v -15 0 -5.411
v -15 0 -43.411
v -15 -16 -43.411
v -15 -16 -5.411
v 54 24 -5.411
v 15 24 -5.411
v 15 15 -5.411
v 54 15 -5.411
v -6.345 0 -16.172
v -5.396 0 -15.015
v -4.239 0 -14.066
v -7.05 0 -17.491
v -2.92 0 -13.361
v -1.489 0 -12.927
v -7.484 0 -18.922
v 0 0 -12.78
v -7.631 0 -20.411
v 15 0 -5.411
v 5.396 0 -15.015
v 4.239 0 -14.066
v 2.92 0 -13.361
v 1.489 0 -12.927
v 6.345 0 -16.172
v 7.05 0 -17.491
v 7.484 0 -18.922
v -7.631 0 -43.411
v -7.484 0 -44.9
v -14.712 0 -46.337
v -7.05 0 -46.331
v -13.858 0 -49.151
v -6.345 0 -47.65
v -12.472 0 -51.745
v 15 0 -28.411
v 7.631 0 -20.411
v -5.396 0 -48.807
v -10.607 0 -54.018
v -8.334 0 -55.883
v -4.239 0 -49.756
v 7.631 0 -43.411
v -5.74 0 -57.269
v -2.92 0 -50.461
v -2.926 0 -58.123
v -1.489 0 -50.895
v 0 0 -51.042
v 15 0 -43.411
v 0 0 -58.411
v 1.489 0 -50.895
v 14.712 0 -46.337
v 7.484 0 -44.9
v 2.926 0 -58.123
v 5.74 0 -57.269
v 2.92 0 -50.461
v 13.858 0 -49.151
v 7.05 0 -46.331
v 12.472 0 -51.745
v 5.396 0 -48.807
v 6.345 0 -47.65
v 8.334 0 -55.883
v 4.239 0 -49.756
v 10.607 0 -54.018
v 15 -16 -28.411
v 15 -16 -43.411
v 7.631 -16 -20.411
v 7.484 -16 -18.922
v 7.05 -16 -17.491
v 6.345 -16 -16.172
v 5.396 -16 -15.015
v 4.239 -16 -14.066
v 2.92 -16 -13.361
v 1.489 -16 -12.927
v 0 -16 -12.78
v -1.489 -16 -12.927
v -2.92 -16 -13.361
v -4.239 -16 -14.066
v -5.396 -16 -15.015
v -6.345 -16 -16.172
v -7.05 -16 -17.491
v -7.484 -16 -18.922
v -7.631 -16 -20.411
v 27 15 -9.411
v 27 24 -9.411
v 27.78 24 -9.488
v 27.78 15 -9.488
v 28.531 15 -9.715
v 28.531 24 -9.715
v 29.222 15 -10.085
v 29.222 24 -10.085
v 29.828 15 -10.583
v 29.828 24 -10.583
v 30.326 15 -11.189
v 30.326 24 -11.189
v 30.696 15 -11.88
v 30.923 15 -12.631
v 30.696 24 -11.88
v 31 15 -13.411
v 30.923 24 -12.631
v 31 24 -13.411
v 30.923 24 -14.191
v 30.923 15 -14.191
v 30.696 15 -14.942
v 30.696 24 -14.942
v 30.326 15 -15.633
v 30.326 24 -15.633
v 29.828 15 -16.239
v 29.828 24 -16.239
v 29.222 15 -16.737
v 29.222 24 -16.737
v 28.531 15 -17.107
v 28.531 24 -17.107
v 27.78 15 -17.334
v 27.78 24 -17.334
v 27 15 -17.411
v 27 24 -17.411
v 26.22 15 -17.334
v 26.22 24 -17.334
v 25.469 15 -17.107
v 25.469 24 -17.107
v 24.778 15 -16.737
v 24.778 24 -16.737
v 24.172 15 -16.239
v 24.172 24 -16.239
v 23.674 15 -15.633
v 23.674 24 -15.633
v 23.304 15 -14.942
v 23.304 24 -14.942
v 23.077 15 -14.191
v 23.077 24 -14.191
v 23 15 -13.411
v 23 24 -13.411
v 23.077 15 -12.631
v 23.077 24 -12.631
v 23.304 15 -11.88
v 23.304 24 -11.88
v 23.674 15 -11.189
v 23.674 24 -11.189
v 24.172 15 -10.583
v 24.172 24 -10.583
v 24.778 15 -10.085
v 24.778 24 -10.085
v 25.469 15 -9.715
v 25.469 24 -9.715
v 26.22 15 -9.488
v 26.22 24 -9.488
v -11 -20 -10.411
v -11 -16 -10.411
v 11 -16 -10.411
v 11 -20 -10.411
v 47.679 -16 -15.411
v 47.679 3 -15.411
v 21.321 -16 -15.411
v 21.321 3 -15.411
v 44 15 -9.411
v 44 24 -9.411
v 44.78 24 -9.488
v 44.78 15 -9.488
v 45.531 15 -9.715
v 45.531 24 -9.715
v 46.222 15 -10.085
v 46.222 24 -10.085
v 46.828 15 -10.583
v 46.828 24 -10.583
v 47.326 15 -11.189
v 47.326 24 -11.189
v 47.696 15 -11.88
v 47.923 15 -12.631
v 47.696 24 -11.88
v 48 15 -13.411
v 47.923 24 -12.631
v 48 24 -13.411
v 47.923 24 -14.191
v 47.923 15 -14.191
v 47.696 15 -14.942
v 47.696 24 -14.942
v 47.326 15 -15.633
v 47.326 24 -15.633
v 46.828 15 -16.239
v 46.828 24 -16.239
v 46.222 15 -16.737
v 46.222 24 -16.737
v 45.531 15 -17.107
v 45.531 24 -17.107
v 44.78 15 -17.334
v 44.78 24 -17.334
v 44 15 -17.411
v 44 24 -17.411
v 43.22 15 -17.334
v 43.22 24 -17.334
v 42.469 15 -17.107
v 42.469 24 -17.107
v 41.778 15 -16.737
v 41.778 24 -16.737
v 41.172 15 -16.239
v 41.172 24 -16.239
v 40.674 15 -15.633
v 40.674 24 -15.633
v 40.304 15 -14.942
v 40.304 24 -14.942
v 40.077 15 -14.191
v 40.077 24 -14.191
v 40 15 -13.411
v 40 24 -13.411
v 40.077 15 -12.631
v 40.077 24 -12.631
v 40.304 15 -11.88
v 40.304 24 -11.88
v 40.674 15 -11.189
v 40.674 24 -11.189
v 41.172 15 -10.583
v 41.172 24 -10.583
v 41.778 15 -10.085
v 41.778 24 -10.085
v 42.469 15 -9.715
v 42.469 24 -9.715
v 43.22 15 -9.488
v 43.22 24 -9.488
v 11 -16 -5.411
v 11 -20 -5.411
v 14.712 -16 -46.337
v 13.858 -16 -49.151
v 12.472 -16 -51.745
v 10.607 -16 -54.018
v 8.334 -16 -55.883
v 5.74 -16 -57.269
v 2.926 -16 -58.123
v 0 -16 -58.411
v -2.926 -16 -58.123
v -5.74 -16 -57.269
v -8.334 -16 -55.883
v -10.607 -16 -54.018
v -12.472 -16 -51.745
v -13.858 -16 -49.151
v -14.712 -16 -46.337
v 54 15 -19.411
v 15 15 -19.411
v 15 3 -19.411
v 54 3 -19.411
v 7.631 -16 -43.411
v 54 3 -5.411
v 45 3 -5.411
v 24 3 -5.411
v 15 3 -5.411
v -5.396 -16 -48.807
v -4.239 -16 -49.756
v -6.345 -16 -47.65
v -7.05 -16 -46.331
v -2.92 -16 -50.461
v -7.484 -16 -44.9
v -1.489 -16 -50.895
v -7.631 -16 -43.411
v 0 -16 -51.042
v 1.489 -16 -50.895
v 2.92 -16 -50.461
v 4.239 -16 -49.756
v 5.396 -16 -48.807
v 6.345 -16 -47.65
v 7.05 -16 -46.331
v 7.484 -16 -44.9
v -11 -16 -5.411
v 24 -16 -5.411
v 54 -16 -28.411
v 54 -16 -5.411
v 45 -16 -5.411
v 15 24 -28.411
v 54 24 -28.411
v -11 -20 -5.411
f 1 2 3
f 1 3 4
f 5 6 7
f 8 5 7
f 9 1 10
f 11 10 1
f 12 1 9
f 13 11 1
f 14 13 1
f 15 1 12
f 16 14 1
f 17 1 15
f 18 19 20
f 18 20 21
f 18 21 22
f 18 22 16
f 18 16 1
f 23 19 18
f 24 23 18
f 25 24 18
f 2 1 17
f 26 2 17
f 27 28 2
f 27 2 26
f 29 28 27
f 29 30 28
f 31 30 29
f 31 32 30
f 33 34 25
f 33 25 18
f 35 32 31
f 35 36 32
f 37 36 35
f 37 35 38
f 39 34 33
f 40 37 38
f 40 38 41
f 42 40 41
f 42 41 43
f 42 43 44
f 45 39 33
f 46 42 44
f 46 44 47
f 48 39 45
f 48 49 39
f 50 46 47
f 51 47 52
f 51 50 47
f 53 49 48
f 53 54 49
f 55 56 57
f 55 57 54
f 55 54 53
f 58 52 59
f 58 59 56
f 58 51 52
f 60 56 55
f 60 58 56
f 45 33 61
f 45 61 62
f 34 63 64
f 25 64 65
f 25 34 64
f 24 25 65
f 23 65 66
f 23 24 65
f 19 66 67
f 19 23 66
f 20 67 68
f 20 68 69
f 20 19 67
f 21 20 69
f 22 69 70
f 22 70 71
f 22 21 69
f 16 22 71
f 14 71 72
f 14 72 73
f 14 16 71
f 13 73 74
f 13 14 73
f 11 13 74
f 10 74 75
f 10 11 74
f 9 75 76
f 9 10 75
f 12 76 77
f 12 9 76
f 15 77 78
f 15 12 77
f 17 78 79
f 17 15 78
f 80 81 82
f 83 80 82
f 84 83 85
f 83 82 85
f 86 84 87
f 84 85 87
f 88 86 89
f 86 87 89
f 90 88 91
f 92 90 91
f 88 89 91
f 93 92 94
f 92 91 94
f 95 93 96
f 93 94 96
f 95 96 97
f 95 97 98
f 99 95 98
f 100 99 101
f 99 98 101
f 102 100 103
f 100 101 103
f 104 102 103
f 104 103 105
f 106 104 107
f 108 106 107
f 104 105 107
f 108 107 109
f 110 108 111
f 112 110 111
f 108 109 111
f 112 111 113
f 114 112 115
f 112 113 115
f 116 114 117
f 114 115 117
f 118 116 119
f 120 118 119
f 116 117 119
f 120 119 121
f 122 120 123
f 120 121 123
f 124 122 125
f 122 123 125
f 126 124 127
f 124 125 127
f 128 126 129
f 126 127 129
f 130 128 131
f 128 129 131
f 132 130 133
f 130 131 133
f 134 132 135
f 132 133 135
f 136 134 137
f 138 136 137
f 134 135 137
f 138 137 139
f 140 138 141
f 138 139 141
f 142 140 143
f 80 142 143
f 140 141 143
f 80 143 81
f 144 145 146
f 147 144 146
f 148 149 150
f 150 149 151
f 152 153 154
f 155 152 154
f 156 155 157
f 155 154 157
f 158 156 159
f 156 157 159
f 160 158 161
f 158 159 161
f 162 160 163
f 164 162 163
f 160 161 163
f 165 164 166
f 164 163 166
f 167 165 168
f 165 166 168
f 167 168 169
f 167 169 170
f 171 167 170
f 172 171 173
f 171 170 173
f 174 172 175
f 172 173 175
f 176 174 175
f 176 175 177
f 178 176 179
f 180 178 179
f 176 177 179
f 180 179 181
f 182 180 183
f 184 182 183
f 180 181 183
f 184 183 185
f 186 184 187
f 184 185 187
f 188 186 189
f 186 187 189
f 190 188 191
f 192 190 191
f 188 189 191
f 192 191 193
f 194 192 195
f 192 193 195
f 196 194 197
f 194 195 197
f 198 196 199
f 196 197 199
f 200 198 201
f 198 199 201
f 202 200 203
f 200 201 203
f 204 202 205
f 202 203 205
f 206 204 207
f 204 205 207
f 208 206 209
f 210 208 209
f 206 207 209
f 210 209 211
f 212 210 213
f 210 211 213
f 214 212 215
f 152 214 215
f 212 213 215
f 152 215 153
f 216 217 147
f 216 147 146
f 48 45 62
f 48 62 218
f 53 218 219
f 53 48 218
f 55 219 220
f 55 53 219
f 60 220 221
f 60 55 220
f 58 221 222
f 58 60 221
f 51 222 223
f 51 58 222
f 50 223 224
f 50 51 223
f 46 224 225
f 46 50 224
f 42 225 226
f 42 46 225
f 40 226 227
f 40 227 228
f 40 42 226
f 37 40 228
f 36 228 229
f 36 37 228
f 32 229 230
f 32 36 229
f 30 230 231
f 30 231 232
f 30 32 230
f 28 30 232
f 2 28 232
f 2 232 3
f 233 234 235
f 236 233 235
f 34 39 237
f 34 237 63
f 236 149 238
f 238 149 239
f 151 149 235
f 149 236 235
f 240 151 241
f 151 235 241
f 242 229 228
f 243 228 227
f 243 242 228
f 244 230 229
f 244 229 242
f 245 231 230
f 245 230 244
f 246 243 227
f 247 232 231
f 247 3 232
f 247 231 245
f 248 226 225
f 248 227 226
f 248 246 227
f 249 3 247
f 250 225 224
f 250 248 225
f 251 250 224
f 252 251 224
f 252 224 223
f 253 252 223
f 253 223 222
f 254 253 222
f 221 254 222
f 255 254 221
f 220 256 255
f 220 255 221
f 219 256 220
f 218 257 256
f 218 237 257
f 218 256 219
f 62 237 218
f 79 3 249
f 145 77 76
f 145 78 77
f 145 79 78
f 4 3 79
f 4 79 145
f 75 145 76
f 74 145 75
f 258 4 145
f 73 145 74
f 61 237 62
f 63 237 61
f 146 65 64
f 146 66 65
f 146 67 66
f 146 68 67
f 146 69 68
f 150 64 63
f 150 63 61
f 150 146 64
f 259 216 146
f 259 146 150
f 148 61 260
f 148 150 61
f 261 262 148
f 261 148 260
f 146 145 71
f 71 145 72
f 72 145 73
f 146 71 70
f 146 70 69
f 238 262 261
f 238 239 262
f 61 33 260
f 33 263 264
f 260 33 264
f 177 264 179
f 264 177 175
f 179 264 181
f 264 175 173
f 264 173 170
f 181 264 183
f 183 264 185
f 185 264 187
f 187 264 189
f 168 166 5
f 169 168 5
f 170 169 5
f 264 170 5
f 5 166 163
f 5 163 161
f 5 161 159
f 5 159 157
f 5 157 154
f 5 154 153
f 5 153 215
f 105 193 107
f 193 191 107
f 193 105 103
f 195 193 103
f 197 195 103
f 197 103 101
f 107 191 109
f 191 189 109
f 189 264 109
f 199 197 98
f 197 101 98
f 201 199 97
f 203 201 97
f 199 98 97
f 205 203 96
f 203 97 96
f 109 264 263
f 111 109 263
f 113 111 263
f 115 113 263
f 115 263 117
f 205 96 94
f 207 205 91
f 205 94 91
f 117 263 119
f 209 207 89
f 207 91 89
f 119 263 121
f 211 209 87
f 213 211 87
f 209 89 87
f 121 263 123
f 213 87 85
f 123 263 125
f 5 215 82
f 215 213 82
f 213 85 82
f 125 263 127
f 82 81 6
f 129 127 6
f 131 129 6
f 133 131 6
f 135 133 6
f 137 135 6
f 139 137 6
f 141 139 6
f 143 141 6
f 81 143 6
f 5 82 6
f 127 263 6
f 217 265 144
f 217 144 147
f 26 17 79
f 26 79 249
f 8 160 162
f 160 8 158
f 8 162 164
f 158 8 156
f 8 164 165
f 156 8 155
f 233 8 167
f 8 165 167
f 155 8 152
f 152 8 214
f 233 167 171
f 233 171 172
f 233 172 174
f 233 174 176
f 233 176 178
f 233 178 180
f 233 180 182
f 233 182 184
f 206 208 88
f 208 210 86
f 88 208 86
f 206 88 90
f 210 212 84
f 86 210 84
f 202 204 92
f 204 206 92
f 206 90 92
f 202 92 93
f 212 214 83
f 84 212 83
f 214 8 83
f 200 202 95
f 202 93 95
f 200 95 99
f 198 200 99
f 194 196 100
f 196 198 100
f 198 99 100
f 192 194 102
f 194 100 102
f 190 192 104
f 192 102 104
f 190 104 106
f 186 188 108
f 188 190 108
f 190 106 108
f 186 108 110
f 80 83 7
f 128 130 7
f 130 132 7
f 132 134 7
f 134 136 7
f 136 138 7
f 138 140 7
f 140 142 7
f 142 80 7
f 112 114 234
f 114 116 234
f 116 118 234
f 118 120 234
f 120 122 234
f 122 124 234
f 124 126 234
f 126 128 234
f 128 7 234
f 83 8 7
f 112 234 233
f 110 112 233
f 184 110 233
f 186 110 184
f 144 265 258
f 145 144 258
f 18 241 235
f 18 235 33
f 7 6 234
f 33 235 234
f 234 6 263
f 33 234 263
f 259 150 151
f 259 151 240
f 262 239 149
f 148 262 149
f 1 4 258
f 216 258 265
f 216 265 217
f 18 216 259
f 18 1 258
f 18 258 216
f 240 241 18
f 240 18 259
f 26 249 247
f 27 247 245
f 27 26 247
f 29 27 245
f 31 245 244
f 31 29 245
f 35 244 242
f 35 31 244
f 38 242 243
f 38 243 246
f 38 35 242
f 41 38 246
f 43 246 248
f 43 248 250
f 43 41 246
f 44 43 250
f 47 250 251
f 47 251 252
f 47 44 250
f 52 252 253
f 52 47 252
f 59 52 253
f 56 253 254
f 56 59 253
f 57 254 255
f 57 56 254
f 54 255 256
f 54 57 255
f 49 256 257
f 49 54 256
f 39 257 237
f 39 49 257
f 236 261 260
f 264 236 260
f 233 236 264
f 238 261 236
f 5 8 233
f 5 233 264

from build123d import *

# Parameters (mm, degrees)
BOSS_EXTRUDE1_DEPTH = 16
BOSS_EXTRUDE2_DEPTH = 39
SKETCH5_R           = 4
CUT_EXTRUDE1_DEPTH  = 9
SKETCH7_W           = 39
SKETCH7_H           = 16
BOSS_EXTRUDE3_DEPTH = 23
CUT_EXTRUDE2_DEPTH  = 23
SKETCH10_W          = 22
SKETCH10_H          = 4
BOSS_EXTRUDE4_DEPTH = 5


with BuildPart() as part:
    # Sketch2 → Boss-Extrude1 (new body)
    with BuildSketch(Plane(origin=(0, 0, 0), x_dir=(1, 0, 0), z_dir=(0, 1, 0))):
        with BuildLine():
            Line((-15, 43.410987083), (-15, 5.410987083))
            Line((-15, 5.410987083), (15, 5.410987083))
            Line((15, 5.410987083), (15, 43.410987083))
            Line((15, 43.410987083), (7.630797424, 43.410987083))
            Line((7.630797424, 43.410987083), (7.630797424, 20.410987083))
            ThreePointArc((7.630797424, 20.410987083), (0, 12.780189659), (-7.630797424, 20.410987083))
            Line((-7.630797424, 20.410987083), (-7.630797424, 43.410987083))
            Line((-7.630797424, 43.410987083), (-15, 43.410987083))
        make_face()
        with BuildLine():
            ThreePointArc((15, 43.410987083), (0, 58.410987083), (-15, 43.410987083))
            Line((-15, 43.410987083), (-7.630797424, 43.410987083))
            ThreePointArc((-7.630797424, 43.410987083), (0, 51.041784507), (7.630797424, 43.410987083))
            Line((7.630797424, 43.410987083), (15, 43.410987083))
        make_face()
    extrude(amount=-BOSS_EXTRUDE1_DEPTH)



with BuildPart() as body_2:
    # Sketch4 → Boss-Extrude2 (new body)
    with BuildSketch(Plane(origin=(15, 0, 0), x_dir=(0, 0, -1), z_dir=(1, 0, 0))):
        Polygon((5.410987083, 24), (5.410987083, 15), (19.410987083, 15), (19.410987083, 3), (5.410987083, 3), (5.410987083, 0), (28.410987083, 0), (28.410987083, 24), align=None)
    extrude(amount=BOSS_EXTRUDE2_DEPTH)

    # Sketch5 → Cut-Extrude1 (cut)
    with BuildSketch(Plane(origin=(0, 24, 0), x_dir=(1, 0, 0), z_dir=(0, 1, 0))):
        with Locations(Location((27, 13.410987083, 0), (0, 0, 270))):
            Circle(SKETCH5_R)
        with Locations(Location((44, 13.410987083, 0), (0, 0, 270))):
            Circle(SKETCH5_R)
    extrude(amount=-CUT_EXTRUDE1_DEPTH, mode=Mode.SUBTRACT)


with BuildPart() as part_1:
    add(part.part)

    add(body_2.part)  # Boss-Extrude3 merges body 2
    # Sketch7 → Boss-Extrude3 (add)
    with BuildSketch(Plane.XY.offset(-5.410987083)):
        with Locations((34.5, -8)):
            Rectangle(SKETCH7_W, SKETCH7_H)
    extrude(amount=-BOSS_EXTRUDE3_DEPTH)

    # Sketch9 → Cut-Extrude2 (cut)
    with BuildSketch(Plane(origin=(0, 3, 0), x_dir=(1, 0, 0), z_dir=(0, 1, 0))):
        Polygon((21.320508076, 15.410987083), (24, 5.410987083), (45, 5.410987083), (47.679491924, 15.410987083), align=None)
    extrude(amount=-CUT_EXTRUDE2_DEPTH, mode=Mode.SUBTRACT)

    # Sketch10 → Boss-Extrude4 (add)
    with BuildSketch(Plane.XY.offset(-5.410987083)):
        with Locations((0, -18)):
            Rectangle(SKETCH10_W, SKETCH10_H)
    extrude(amount=-BOSS_EXTRUDE4_DEPTH)


solid = part_1.part
